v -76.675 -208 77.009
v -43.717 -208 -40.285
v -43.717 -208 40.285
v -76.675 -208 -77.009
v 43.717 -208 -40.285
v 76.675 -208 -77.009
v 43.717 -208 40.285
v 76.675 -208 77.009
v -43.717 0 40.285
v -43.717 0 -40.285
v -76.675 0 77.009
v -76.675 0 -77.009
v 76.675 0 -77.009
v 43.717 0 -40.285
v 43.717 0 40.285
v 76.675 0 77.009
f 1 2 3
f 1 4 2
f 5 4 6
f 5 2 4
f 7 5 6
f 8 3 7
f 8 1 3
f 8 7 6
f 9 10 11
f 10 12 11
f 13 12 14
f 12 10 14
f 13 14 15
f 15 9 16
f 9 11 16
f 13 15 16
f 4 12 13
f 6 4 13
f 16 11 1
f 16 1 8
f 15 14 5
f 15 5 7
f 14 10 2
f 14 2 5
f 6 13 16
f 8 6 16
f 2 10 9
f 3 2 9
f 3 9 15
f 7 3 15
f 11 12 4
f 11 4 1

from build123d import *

# Parameters (mm, degrees)
F0_W     = 153.35077
F0_H     = 154.018536
F0_W_2   = 87.434582
F0_H_2   = 80.570326
F1_DEPTH = 35
F2_DEPTH = 208


with BuildPart() as f1:
    # F0 (on Front) → F1 (new body)
    with BuildSketch(Plane.XZ):
        Rectangle(F0_W, F0_H)
        Rectangle(F0_W_2, F0_H_2, mode=Mode.SUBTRACT)
    extrude(amount=F1_DEPTH)

    # F0 (on Front) → F2 (join)
    with BuildSketch(Plane.XZ):
        Rectangle(F0_W, F0_H)
        Rectangle(F0_W_2, F0_H_2, mode=Mode.SUBTRACT)
    extrude(amount=F2_DEPTH)


solid = f1.part
